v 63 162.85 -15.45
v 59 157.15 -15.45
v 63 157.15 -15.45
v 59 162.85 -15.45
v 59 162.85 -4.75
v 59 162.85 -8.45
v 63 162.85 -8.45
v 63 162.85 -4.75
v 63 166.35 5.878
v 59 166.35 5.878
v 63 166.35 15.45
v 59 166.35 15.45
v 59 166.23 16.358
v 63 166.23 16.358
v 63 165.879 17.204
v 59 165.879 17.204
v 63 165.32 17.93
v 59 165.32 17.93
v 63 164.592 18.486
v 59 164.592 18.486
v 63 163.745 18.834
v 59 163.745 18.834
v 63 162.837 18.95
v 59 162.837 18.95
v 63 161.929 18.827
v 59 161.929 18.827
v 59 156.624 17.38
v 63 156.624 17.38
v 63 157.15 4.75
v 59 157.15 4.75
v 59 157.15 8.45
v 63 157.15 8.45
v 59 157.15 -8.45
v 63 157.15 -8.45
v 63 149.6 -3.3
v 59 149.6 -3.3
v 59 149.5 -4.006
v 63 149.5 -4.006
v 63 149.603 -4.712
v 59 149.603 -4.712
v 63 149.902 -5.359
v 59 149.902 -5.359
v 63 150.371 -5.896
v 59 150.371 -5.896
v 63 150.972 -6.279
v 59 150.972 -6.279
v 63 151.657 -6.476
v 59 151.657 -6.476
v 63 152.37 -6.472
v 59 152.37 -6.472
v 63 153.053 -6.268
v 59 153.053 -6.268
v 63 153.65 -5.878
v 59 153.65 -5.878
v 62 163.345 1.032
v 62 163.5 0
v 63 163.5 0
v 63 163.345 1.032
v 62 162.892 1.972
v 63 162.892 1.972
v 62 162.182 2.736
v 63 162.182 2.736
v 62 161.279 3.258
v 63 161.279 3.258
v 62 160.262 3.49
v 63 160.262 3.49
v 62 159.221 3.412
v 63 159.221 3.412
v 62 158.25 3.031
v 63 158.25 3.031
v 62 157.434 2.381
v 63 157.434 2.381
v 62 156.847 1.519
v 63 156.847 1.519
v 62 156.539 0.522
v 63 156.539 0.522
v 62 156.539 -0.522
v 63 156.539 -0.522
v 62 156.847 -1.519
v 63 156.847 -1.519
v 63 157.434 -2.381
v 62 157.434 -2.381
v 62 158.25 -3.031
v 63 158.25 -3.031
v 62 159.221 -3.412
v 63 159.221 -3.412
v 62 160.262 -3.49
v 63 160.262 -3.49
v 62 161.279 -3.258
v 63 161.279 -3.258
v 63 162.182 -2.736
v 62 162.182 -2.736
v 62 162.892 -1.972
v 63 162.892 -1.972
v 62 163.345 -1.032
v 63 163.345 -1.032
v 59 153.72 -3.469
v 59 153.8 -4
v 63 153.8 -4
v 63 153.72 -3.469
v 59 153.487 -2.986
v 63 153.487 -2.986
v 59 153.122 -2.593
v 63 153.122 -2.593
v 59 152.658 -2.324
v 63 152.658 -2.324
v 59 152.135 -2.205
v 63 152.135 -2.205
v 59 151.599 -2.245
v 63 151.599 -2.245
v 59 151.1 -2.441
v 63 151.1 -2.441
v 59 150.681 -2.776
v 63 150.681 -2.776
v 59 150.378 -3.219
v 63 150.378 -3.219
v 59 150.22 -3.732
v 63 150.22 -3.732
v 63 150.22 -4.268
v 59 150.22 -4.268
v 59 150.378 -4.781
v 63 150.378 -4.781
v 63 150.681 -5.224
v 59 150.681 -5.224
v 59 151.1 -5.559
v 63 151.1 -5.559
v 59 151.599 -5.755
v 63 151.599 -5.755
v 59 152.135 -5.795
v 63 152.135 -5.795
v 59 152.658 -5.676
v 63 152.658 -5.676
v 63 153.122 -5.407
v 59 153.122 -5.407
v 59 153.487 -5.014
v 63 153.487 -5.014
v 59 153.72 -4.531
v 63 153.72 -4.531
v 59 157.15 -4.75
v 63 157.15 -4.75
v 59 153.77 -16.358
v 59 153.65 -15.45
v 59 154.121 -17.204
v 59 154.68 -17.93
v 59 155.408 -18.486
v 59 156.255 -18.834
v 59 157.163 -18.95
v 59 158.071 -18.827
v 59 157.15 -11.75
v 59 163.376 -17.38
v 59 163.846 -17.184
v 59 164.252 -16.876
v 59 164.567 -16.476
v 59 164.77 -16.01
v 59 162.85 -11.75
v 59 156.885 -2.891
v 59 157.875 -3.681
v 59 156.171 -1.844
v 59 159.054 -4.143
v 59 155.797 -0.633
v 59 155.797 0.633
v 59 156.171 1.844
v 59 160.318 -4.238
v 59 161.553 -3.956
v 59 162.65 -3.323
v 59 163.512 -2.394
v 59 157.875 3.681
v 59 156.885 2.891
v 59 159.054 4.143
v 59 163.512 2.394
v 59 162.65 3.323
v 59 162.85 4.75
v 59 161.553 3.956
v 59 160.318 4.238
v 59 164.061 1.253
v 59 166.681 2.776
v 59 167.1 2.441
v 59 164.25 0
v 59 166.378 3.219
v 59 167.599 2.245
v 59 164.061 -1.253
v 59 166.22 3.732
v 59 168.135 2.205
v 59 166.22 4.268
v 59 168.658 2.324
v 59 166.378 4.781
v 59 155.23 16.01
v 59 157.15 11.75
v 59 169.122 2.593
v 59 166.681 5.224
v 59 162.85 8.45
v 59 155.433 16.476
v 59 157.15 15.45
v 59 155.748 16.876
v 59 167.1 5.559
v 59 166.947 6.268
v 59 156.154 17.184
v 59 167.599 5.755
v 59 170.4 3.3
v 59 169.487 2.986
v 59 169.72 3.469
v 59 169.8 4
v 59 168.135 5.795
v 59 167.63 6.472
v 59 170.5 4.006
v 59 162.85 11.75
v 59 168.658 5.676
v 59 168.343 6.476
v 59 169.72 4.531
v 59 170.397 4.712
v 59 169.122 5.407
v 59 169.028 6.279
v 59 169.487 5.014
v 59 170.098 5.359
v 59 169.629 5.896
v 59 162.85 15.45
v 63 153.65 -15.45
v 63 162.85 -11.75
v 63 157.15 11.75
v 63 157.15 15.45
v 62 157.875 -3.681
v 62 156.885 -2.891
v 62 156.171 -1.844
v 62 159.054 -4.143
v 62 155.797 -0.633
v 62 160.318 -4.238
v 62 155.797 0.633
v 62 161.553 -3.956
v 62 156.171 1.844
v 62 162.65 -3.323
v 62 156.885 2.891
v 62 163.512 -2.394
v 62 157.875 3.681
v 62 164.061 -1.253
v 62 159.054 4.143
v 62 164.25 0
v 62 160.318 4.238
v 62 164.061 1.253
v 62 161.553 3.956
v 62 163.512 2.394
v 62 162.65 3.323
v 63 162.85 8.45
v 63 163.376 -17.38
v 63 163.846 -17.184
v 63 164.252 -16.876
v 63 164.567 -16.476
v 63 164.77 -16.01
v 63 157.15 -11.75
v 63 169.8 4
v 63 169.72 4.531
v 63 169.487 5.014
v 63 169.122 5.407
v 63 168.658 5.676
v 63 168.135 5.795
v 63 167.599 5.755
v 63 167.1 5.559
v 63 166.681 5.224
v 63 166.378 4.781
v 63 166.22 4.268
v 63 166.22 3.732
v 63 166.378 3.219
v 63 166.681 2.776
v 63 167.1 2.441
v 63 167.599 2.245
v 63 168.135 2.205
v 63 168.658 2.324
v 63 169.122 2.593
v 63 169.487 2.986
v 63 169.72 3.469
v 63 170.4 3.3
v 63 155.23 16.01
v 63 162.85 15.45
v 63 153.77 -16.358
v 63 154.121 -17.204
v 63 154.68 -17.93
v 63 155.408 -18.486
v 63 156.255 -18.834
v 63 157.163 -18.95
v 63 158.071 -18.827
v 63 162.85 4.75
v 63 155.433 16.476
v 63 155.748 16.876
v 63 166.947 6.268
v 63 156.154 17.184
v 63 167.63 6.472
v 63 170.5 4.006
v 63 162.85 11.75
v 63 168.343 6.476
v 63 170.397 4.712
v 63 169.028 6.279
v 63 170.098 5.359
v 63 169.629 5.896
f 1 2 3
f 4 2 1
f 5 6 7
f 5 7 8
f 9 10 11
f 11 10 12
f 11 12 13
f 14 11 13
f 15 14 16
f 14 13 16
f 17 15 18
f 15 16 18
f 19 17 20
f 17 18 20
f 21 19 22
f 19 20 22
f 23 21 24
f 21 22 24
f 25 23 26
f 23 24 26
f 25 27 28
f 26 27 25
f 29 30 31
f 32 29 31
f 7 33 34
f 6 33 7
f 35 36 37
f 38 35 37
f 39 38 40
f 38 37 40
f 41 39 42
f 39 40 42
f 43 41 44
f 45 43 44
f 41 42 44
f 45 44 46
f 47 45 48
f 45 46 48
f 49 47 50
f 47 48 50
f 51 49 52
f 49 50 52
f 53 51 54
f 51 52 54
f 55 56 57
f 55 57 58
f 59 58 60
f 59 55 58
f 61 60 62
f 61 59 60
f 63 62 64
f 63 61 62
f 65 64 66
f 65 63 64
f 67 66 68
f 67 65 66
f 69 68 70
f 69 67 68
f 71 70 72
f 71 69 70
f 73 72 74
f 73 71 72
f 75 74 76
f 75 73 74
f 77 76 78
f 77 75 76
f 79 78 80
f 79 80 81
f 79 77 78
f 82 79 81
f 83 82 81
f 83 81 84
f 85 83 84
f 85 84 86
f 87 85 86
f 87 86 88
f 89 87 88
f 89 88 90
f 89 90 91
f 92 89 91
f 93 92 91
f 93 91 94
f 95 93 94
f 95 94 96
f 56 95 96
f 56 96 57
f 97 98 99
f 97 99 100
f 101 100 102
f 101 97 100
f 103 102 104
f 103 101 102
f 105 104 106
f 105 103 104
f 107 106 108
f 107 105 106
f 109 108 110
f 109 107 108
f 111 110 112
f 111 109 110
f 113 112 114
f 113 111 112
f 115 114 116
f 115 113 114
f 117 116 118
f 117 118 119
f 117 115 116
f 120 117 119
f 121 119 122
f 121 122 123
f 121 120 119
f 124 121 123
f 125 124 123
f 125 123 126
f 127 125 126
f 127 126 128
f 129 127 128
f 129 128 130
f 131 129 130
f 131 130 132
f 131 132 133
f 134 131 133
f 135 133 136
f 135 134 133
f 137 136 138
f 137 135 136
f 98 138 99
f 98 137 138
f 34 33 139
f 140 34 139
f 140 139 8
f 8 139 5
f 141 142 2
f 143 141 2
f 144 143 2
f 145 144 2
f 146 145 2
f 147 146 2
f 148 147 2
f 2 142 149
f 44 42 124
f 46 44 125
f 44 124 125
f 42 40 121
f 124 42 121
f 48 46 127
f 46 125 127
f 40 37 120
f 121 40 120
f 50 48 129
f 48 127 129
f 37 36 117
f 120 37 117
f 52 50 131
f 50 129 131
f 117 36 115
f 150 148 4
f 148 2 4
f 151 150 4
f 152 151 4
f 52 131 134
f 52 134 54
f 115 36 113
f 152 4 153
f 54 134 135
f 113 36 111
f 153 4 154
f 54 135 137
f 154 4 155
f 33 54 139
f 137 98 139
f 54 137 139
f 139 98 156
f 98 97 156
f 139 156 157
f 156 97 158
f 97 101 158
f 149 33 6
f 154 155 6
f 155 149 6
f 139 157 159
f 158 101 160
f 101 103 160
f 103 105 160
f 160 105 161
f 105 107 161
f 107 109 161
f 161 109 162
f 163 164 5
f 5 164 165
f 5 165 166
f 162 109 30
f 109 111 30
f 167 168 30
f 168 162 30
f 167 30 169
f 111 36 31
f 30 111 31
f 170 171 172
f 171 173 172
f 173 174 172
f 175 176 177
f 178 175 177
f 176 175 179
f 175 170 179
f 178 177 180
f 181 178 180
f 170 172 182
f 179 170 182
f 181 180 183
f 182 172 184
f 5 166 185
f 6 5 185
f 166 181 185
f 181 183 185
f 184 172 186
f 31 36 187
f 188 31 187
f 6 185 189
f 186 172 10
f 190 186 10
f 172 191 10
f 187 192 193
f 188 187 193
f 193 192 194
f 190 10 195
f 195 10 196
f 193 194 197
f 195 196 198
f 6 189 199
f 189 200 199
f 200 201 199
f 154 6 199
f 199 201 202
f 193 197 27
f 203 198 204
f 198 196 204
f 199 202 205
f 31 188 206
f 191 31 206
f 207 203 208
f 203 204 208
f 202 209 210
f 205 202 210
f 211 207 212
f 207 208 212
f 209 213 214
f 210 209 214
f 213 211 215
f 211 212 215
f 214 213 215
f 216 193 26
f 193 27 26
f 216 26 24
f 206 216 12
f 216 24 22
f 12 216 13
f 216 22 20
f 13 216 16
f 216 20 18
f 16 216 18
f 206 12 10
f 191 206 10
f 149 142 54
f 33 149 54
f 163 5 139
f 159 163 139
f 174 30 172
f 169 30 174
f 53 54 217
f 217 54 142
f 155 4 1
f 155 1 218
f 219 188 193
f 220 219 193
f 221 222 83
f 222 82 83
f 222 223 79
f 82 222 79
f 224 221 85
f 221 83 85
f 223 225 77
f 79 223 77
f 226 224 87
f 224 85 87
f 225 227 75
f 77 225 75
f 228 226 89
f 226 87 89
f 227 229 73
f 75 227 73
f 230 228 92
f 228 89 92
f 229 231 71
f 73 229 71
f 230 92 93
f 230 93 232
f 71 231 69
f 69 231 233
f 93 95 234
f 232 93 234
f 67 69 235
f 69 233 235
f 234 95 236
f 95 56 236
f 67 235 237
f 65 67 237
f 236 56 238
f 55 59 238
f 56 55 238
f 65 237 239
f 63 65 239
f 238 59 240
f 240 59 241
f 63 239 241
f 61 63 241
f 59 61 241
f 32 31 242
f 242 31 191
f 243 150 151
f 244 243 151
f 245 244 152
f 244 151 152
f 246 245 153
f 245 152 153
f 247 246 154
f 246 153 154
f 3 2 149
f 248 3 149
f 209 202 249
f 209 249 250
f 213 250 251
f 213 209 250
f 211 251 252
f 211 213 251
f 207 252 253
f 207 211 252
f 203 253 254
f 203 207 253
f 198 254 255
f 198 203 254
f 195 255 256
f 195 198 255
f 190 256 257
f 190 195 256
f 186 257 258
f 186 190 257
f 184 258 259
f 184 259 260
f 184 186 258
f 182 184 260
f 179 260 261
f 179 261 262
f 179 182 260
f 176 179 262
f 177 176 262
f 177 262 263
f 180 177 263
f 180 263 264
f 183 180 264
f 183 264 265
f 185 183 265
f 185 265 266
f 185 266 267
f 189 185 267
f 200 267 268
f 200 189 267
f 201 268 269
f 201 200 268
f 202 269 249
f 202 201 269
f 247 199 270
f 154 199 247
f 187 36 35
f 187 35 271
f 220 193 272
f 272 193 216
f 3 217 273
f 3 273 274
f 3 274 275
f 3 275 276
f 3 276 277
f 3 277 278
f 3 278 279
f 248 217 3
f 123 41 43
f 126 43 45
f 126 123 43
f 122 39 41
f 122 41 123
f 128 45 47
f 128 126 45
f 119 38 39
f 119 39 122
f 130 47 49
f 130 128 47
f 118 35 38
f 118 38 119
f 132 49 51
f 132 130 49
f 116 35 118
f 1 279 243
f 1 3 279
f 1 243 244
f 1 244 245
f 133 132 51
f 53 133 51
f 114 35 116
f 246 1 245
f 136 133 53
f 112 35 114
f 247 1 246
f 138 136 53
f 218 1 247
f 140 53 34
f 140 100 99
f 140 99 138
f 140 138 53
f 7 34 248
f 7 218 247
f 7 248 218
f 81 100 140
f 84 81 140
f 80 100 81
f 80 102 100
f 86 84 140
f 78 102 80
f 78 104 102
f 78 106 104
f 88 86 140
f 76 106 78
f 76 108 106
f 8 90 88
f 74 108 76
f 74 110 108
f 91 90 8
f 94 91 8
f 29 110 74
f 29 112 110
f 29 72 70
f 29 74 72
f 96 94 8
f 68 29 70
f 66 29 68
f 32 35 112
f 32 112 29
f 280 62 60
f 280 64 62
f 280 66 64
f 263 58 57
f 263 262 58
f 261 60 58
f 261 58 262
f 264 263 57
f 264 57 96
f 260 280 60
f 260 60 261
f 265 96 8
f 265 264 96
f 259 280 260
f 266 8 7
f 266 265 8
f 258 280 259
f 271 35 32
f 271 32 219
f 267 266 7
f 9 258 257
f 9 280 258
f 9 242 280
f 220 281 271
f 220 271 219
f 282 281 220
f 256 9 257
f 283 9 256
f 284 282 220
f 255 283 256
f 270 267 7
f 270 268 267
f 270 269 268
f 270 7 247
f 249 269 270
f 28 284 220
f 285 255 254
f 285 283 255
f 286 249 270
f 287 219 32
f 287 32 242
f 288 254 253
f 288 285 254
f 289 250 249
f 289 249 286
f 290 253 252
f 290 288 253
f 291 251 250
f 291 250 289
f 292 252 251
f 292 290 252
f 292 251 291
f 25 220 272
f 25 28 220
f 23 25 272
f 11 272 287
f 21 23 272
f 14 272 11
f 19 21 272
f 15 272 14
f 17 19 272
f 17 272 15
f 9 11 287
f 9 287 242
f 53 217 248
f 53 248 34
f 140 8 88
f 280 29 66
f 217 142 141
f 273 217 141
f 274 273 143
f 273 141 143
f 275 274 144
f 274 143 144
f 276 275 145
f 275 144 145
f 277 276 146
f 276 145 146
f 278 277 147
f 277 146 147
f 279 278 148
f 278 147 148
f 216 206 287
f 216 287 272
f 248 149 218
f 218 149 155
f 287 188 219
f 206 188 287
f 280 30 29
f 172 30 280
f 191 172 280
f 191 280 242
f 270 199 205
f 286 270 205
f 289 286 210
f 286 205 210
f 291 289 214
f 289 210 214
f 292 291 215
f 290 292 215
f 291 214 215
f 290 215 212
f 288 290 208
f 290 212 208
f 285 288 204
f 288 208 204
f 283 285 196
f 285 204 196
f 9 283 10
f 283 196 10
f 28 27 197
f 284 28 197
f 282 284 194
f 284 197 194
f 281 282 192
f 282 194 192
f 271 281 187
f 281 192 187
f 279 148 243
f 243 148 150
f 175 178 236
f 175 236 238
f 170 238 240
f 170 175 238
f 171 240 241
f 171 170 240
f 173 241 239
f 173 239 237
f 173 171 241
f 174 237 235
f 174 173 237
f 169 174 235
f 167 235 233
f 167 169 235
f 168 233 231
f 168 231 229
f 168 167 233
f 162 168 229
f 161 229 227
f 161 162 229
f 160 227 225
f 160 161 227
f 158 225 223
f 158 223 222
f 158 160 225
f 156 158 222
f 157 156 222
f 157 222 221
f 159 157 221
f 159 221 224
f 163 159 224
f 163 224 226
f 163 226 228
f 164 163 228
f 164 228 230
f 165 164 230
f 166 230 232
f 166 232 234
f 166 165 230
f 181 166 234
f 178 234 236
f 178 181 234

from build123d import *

# Parameters (mm, degrees)
SKETCH171_R     = 4.25
PAD127009_DEPTH = 3
SKETCH147_R     = 3.5
SKETCH147_R_2   = 1.8
SKETCH147_W     = 5.7
SKETCH147_H     = 3.7
PAD115_DEPTH    = 4


with BuildPart() as bearingcutout:
    # Sketch171 → Pad127009 (new body)
    with BuildSketch(Plane(origin=(59, 160, 0), x_dir=(0, 1, 0), z_dir=(1, 0, 0))):
        Circle(SKETCH171_R)
    extrude(amount=PAD127009_DEPTH)


with BuildPart() as wheelbearingbase:
    # Sketch147 → Pad115 (new body)
    with BuildSketch(Plane(origin=(59, 160, 0), x_dir=(0, 1, 0), z_dir=(1, 0, 0))):
        with BuildLine():
            ThreePointArc((10.40007, 3.300239), (9.342414, 6.10901), (6.35, 5.878164))
            Line((6.35, 5.878164), (6.35, 15.45))
            ThreePointArc((6.35, 15.45), (4.974419, 18.231518), (1.928947, 18.826635))
            Line((-3.376316, 17.379506), (1.928947, 18.826635))
            ThreePointArc((-3.376316, 17.379506), (-4.251863, 16.876457), (-4.770061, 16.00979))
            Line((-10.40007, -3.300239), (-4.770061, 16.00979))
            ThreePointArc((-10.40007, -3.300239), (-9.342414, -6.10901), (-6.35, -5.878164))
            Line((-6.35, -5.878164), (-6.35, -15.45))
            ThreePointArc((-6.35, -15.45), (-4.974419, -18.231518), (-1.928947, -18.826635))
            Line((-1.928947, -18.826635), (3.376315, -17.379506))
            ThreePointArc((3.376315, -17.379506), (4.251856, -16.876464), (4.770056, -16.009808))
            Line((10.40007, 3.300239), (4.770056, -16.009808))
        make_face()
        Circle(SKETCH147_R, mode=Mode.SUBTRACT)
        with Locations((-8, -4)):
            Circle(SKETCH147_R_2, mode=Mode.SUBTRACT)
        with Locations((8, 4)):
            Circle(SKETCH147_R_2, mode=Mode.SUBTRACT)
        with Locations((0, 6.6)):
            Rectangle(SKETCH147_W, SKETCH147_H, mode=Mode.SUBTRACT)
        with Locations((0, -13.6)):
            Rectangle(SKETCH147_W, SKETCH147_H, mode=Mode.SUBTRACT)
        with Locations((0, 13.6)):
            Rectangle(SKETCH147_W, SKETCH147_H, mode=Mode.SUBTRACT)
        with Locations((0, -6.6)):
            Rectangle(SKETCH147_W, SKETCH147_H, mode=Mode.SUBTRACT)
    extrude(amount=PAD115_DEPTH)

    # Cut007019018: cut BearingCutout
    add(bearingcutout.part, mode=Mode.SUBTRACT)


solid = wheelbearingbase.part
